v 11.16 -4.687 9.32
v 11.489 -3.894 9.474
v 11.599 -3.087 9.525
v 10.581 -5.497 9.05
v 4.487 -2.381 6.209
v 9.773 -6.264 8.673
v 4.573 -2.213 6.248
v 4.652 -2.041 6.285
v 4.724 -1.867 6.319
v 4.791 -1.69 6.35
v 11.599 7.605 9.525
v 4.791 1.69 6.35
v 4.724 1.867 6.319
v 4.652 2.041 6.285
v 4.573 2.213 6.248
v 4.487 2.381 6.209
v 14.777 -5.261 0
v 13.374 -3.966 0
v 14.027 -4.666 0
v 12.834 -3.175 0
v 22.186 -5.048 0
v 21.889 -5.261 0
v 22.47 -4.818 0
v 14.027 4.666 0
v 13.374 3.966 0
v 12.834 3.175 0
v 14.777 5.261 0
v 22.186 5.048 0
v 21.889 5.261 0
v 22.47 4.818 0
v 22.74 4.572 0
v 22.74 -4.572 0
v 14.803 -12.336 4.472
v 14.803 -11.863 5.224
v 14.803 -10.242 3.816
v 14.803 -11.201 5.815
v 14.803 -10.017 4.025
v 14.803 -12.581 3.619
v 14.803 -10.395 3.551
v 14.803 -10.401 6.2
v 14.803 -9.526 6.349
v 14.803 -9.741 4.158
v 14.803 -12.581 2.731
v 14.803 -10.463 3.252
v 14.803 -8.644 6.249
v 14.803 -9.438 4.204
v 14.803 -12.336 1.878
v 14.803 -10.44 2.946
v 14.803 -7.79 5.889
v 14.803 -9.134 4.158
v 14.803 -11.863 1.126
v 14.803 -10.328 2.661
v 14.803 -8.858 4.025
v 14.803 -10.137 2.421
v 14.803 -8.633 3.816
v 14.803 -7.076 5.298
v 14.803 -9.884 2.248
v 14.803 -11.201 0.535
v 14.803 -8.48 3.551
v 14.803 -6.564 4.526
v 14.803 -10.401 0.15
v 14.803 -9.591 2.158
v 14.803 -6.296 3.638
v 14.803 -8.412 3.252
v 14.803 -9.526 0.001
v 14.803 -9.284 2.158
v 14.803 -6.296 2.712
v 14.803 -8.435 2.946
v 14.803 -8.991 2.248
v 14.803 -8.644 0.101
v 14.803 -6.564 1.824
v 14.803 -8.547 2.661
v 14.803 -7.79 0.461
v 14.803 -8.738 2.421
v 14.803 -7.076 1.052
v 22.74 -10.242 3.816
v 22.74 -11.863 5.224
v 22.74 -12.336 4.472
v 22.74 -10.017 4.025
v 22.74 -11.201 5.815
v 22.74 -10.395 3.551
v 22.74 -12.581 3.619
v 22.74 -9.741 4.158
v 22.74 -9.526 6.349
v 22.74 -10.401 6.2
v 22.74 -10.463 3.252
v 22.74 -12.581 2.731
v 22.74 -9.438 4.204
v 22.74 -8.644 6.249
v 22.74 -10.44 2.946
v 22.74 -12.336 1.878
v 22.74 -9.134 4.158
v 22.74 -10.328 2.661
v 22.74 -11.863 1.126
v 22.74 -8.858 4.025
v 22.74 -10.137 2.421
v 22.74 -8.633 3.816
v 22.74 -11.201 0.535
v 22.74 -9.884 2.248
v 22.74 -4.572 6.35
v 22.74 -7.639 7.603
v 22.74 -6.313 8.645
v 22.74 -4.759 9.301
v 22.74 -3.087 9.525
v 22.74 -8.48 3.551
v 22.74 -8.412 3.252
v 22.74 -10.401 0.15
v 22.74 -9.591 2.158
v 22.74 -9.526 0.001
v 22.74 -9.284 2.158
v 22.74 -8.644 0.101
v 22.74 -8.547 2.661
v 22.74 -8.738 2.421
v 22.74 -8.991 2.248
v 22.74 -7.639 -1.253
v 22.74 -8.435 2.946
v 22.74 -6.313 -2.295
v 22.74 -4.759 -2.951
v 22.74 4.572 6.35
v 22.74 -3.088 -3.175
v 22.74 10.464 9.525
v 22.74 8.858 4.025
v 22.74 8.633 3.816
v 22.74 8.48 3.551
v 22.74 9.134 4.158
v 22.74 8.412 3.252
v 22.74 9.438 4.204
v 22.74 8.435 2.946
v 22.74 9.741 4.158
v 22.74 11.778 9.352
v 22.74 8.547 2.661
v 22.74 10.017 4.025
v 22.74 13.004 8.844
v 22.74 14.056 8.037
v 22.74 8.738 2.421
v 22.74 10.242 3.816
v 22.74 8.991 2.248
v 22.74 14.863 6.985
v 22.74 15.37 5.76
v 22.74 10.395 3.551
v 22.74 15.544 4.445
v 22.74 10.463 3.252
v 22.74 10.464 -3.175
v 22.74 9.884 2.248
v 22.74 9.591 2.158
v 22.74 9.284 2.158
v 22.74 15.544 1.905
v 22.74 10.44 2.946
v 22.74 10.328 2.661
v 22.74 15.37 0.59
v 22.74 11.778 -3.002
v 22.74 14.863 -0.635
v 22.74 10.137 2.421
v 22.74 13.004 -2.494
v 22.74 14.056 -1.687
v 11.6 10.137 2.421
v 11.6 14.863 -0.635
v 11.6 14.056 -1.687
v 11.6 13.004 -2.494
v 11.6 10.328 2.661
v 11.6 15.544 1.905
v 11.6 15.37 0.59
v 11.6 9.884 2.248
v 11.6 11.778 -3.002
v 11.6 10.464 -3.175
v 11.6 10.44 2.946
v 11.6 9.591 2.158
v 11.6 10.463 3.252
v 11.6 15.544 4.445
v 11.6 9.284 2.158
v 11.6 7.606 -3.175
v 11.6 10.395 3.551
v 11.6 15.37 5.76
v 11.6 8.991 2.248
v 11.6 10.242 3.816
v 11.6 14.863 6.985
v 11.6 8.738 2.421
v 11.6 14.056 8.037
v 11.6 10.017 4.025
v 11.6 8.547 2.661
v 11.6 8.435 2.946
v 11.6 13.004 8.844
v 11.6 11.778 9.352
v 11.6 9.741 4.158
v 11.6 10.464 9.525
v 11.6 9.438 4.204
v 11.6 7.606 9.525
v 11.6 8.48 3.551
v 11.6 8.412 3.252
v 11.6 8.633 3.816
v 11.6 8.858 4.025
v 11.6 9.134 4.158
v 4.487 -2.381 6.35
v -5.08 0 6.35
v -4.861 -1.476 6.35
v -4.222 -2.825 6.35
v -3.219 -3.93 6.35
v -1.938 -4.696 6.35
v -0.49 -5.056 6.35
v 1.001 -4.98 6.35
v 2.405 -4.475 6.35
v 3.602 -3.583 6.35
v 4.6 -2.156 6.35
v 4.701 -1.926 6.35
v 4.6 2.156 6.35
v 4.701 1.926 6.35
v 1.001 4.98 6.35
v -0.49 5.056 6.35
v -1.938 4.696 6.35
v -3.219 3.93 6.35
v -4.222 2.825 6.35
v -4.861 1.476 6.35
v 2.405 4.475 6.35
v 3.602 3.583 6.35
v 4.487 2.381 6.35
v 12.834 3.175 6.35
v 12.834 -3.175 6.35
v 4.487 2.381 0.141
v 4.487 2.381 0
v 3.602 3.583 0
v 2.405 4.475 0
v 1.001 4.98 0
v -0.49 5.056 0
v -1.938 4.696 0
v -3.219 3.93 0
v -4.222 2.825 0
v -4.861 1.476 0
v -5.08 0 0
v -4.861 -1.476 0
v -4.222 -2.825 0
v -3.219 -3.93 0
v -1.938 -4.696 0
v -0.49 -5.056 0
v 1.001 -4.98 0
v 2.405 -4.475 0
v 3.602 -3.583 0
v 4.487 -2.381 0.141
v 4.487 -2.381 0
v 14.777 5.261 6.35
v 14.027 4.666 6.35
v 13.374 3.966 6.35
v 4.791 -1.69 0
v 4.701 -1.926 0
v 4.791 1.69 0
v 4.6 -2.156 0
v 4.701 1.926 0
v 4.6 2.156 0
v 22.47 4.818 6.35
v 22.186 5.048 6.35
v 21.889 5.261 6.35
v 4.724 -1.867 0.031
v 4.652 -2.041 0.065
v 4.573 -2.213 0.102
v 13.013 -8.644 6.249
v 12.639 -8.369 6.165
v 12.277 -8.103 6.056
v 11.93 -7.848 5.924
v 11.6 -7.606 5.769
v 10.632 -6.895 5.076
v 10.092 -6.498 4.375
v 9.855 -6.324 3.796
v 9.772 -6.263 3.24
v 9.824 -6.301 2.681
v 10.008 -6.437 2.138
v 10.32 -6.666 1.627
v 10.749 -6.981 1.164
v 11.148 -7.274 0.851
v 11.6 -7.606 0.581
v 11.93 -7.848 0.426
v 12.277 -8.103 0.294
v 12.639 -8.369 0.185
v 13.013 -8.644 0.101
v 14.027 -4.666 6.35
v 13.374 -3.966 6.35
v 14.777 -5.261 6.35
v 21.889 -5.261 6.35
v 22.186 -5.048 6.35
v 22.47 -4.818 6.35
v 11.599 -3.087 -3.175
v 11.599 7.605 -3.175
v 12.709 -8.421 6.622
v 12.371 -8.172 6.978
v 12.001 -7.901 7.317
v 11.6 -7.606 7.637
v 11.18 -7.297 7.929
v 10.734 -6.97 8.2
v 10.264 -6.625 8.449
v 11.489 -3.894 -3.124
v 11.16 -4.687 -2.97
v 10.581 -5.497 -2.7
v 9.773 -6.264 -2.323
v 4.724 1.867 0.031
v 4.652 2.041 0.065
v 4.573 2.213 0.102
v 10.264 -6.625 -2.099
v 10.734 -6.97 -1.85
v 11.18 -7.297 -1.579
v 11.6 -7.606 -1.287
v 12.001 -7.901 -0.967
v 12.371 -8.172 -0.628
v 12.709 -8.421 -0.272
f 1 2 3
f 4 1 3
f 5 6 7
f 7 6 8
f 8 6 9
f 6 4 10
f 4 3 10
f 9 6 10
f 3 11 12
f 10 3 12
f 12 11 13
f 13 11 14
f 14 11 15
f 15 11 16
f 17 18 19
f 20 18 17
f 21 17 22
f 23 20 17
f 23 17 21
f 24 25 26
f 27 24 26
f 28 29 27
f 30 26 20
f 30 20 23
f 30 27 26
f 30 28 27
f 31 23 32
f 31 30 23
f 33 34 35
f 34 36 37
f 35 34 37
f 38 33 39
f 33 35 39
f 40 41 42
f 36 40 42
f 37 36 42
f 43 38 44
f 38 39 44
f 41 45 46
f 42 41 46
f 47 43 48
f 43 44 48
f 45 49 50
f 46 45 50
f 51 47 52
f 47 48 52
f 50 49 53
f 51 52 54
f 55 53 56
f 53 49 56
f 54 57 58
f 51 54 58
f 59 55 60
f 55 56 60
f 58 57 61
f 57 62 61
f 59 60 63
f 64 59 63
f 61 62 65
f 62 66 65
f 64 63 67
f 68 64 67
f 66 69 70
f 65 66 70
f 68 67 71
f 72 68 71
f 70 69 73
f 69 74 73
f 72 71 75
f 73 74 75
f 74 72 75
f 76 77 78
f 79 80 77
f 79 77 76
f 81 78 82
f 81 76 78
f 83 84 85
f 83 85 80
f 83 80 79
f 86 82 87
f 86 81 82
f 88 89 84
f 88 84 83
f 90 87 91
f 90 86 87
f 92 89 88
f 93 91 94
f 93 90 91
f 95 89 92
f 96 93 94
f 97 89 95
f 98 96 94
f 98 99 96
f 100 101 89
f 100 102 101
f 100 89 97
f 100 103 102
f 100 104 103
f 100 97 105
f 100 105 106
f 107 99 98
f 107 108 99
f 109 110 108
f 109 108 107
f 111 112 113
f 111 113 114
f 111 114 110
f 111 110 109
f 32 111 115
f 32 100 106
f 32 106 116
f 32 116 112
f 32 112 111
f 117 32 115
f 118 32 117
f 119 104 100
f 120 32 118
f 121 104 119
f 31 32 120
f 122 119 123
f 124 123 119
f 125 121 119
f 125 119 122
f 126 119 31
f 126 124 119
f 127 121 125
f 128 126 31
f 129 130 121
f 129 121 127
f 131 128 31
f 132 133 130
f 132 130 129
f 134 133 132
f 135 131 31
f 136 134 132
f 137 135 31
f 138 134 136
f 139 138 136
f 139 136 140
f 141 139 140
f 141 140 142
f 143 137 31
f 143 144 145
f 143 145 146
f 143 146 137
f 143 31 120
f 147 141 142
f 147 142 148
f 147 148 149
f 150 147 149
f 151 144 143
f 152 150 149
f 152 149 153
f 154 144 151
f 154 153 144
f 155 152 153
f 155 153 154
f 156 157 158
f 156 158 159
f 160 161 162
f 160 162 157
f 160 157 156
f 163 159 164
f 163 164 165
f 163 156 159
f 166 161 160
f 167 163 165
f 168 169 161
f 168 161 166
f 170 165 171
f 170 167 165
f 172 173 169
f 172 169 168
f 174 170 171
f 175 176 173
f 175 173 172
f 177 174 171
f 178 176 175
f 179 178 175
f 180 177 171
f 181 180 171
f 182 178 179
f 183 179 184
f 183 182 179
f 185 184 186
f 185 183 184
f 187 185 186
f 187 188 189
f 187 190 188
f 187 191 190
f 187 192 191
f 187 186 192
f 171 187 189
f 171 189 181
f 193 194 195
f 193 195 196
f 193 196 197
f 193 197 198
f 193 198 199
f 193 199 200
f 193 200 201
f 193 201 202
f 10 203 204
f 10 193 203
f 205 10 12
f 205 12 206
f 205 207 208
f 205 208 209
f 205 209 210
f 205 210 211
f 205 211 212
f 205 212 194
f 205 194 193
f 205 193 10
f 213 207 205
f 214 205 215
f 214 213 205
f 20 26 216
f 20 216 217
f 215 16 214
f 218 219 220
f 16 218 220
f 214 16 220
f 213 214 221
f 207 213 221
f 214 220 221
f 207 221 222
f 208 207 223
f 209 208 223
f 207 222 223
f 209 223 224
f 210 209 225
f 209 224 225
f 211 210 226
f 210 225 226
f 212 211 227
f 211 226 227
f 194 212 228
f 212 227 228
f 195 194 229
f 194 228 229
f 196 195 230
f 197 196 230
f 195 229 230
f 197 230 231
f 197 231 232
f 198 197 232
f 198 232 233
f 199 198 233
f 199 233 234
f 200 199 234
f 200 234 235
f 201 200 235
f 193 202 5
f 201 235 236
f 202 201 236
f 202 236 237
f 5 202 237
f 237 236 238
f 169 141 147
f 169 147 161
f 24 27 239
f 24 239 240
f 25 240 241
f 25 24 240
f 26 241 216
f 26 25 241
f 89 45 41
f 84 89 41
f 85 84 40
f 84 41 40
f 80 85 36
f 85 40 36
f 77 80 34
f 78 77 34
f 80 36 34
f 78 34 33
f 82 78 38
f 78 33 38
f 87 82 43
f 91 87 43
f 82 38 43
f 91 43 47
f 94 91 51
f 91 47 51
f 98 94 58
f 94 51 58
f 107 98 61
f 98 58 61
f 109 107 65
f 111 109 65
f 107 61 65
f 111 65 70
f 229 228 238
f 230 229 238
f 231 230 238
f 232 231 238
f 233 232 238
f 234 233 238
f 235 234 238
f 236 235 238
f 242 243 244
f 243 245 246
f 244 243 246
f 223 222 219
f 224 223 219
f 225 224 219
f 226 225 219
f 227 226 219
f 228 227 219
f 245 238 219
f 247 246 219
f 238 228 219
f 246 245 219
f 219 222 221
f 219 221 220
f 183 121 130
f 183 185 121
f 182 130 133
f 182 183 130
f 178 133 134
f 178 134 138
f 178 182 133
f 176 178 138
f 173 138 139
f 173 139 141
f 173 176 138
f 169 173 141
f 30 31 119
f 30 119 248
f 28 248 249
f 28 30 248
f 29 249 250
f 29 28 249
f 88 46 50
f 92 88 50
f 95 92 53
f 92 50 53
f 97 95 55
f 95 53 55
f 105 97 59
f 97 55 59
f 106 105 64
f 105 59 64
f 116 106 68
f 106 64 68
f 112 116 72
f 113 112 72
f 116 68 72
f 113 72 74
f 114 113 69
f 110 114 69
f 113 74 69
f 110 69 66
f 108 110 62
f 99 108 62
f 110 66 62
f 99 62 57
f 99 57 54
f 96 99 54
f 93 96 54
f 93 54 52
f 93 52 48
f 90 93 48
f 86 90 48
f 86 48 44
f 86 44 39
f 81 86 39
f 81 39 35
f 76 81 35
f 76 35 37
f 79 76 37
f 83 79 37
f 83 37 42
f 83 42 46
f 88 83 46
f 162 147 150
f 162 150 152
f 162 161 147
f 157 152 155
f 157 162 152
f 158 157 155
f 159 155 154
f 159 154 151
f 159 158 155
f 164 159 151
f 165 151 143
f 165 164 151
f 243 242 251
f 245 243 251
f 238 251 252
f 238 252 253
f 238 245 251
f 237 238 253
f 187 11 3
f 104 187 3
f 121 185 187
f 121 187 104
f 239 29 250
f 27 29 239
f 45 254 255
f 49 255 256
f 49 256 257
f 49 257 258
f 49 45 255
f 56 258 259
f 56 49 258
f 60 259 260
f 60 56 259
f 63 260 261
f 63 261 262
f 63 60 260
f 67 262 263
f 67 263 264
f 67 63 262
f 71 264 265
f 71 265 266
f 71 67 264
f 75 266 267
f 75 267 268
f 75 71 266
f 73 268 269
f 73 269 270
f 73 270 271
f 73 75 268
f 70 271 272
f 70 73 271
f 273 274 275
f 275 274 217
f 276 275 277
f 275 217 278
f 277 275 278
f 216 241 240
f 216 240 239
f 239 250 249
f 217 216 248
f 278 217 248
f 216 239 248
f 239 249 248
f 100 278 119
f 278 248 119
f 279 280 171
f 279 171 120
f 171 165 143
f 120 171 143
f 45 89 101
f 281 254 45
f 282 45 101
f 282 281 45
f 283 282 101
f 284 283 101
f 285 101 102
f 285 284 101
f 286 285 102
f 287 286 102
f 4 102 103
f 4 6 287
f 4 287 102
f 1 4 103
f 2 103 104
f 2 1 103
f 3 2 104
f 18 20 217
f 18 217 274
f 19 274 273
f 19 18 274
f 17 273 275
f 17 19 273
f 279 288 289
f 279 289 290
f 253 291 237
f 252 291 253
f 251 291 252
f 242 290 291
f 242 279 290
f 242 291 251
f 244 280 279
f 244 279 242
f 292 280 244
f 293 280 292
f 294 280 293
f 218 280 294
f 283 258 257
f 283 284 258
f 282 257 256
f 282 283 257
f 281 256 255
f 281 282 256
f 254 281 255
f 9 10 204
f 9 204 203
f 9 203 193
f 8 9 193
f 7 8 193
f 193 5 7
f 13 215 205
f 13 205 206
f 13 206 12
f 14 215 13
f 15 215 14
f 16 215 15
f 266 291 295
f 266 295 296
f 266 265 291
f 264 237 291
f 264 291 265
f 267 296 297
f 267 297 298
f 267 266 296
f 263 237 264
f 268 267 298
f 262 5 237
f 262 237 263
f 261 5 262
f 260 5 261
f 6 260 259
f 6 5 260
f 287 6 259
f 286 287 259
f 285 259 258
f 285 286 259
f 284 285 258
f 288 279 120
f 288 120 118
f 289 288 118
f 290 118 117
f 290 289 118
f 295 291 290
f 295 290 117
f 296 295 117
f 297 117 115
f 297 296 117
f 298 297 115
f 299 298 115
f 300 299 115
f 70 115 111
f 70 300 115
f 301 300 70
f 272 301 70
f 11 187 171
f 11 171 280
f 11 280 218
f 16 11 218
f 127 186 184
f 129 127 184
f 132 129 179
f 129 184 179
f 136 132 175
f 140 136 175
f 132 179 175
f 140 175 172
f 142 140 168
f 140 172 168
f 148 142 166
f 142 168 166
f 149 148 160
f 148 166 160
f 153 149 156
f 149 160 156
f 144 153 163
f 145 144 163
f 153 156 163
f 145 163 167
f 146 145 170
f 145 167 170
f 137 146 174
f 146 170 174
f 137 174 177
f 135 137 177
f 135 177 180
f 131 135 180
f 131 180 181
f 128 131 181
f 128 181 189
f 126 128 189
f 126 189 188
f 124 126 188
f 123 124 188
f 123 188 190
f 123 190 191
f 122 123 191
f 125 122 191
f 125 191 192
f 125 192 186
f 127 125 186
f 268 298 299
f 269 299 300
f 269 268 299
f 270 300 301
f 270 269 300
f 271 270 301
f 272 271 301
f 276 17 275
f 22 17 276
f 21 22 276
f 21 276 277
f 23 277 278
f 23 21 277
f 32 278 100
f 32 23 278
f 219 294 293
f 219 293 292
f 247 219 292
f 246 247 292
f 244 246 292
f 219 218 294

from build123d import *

# Parameters (mm, degrees)
BOSS_EXTRUDE1_DEPTH   = 6.35
BOSS_EXTRUDE2_START   = 3.175
BOSS_EXTRUDE2_DEPTH   = 12.7
CUT_EXTRUDE1_START    = -3.175
CUT_EXTRUDE1_DEPTH    = 6.35
F_1_CLEARANCE_HOLE1_D = 2.0574
FILLET4_START         = 4.487320853
FILLET4_DEPTH         = 18.252718486
FILLET5_R             = 5.08
CHAMFER3_SIZE         = 7.112
CHAMFER3_SIZE_2       = 3.316380065
BOSS_EXTRUDE3_START   = -7.9375
BOSS_EXTRUDE3_DEPTH   = 7.9375
F_1_CLEARANCE_HOLE2_D = 2.0574
SKETCH14_R            = 3.175
CUT_EXTRUDE2_DEPTH    = 27.974866065


with BuildPart() as part:
    # Sketch1 → Boss-Extrude1 (new body)
    with BuildSketch(Plane.XY):
        with BuildLine():
            Line((4.487320853, -2.38125), (4.487320853, 2.38125))
            ThreePointArc((4.487320853, 2.38125), (-5.08, 0), (4.487320853, -2.38125))
        make_face()
    extrude(amount=BOSS_EXTRUDE1_DEPTH)

    # Sketch2 → Boss-Extrude2 (add)
    with BuildSketch(Plane.XY.offset(6.35).offset(BOSS_EXTRUDE2_START)):
        Polygon((4.487320853, 2.38125), (4.487320853, -2.38125), (11.60035513, -7.606064703), (14.093661168, -9.4375), (22.740039339, -9.4375), (22.740039339, -7.631102389), (22.740039339, 7.631102389), (22.740039339, 15.543564703), (11.60035513, 15.543564703), (11.60035513, 7.606064703), align=None)
    extrude(amount=-BOSS_EXTRUDE2_DEPTH)

    # Sketch10 → Cut-Extrude1 (cut)
    with BuildSketch(Plane(origin=(0, 0, -3.175), x_dir=(-1, 0, 0), z_dir=(0, 0, -1)).offset(CUT_EXTRUDE1_START)):
        with BuildLine():
            Line((-22.740039339, -4.572), (-22.740039339, 4.572))
            ThreePointArc((-22.740039339, 4.572), (-22.329545252, 4.934830916), (-21.88930404, 5.260928055))
            Line((-21.88930404, 5.260928055), (-14.77730404, 5.260928055))
            ThreePointArc((-14.77730404, 5.260928055), (-13.687099855, 4.328427737), (-12.834042726, 3.175))
            Line((-12.834042726, 3.175), (-12.834042726, -3.175))
            ThreePointArc((-12.834042726, -3.175), (-13.687099855, -4.328427737), (-14.77730404, -5.260928055))
            Line((-14.77730404, -5.260928055), (-21.88930404, -5.260928055))
            ThreePointArc((-21.88930404, -5.260928055), (-22.329545252, -4.934830916), (-22.740039339, -4.572))
        make_face()
    extrude(amount=-CUT_EXTRUDE1_DEPTH, mode=Mode.SUBTRACT)

    # #1 Clearance Hole1 (through all)
    with Locations(Plane(origin=(22.740039339, 0, 0), x_dir=(0, 0, -1), z_dir=(1, 0, 0))):
        with Locations((-3.175, 9.4375)):
            Hole(F_1_CLEARANCE_HOLE1_D / 2)

    # Fillet4: read off the stored shape, not the designer's step
    # Fillet4 outline → Fillet4 (cut)
    with BuildSketch(Plane.YZ.offset(FILLET4_START)):
        with BuildLine():
            Line((-9.4375, -3.175), (-3.0875, -3.175))
            ThreePointArc((-3.0875, -3.175), (-7.577628061, -1.315128061), (-9.4375, 3.175))
            Line((-9.4375, 3.175), (-9.4375, -3.175))
        make_face()
        with BuildLine():
            Line((-9.4375, 9.525), (-9.4375, 3.175))
            ThreePointArc((-9.4375, 3.175), (-7.577628061, 7.665128061), (-3.0875, 9.525))
            Line((-3.0875, 9.525), (-9.4375, 9.525))
        make_face()
    extrude(amount=FILLET4_DEPTH, mode=Mode.SUBTRACT)

    # Fillet5
    fillet5_edges = [part.edges().sort_by_distance(p)[0] for p in [
        (17.170197235, 15.543564703, -3.175),
        (17.170197235, 15.543564703, 9.525),
    ]]
    fillet(fillet5_edges, radius=FILLET5_R)

    # Chamfer3
    # the kernel refuses this chamfer: 7.112, 3.316380065 mm, written as the material it takes off along each edge
    with BuildSketch(Plane(origin=(4.487320853, 20.808267553, -3.175), x_dir=(1, 0, 0), z_dir=(0, -1, 0))) as chamfer3_piece_1_section:
        Polygon((CHAMFER3_SIZE, 0), (0, CHAMFER3_SIZE_2), (0, 0), align=None)
    chamfer3_piece_1 = extrude(amount=41.616535106, mode=Mode.PRIVATE)
    chamfer3_piece_1 = chamfer3_piece_1 - Plane(origin=(0, 0, -3.175), x_dir=(0.8833308765689106, 0.46875000000000017, 0), z_dir=(0, 0, -1)) * Cylinder(5.08, 112, mode=Mode.PRIVATE)
    add(chamfer3_piece_1, mode=Mode.SUBTRACT)
    with BuildSketch(Plane(origin=(4.487320853, 20.808267553, -3.175), x_dir=(1, 0, 0), z_dir=(0, -1, 0))) as chamfer3_piece_2_section:
        Polygon((CHAMFER3_SIZE, 0), (0, CHAMFER3_SIZE_2), (0, 0), align=None)
    chamfer3_piece_2 = extrude(amount=41.616535106, mode=Mode.PRIVATE)
    chamfer3_piece_2 = split(chamfer3_piece_2, bisect_by=Plane(origin=(4.487320853, 20.808267553, 0), z_dir=(0, 0, -1)), keep=Keep.TOP, mode=Mode.PRIVATE)
    add(chamfer3_piece_2, mode=Mode.SUBTRACT)
    with BuildSketch(Plane(origin=(4.487320853, 20.808267553, 9.525), x_dir=(1, 0, 0), z_dir=(0, -1, 0))) as chamfer3_piece_3_section:
        Polygon((CHAMFER3_SIZE, 0), (0, -CHAMFER3_SIZE_2), (0, 0), align=None)
    chamfer3_piece_3 = extrude(amount=41.616535106, mode=Mode.PRIVATE)
    chamfer3_piece_3 = chamfer3_piece_3 - Plane(origin=(0, 0, 9.525), x_dir=(0.8833308765689106, 0.46875000000000017, 0), z_dir=(0, 0, -1)) * Cylinder(5.08, 112, mode=Mode.PRIVATE)
    add(chamfer3_piece_3, mode=Mode.SUBTRACT)
    with BuildSketch(Plane(origin=(4.487320853, 20.808267553, 9.525), x_dir=(1, 0, 0), z_dir=(0, -1, 0))) as chamfer3_piece_4_section:
        Polygon((CHAMFER3_SIZE, 0), (0, -CHAMFER3_SIZE_2), (0, 0), align=None)
    chamfer3_piece_4 = extrude(amount=41.616535106, mode=Mode.PRIVATE)
    chamfer3_piece_4 = split(chamfer3_piece_4, bisect_by=Plane(origin=(4.487320853, 20.808267553, 6.35), z_dir=(0, 0, 1)), keep=Keep.TOP, mode=Mode.PRIVATE)
    add(chamfer3_piece_4, mode=Mode.SUBTRACT)

    # Sketch11 → Boss-Extrude3 (add)
    with BuildSketch(Plane(origin=(22.740039339, 0, 0), x_dir=(0, 0, -1), z_dir=(1, 0, 0)).offset(BOSS_EXTRUDE3_START)):
        with BuildLine():
            ThreePointArc((-6.249180531, -8.64375), (-3.175, -12.6125), (-0.100819469, -8.64375))
            ThreePointArc((-0.100819469, -8.64375), (-3.175, -9.4375), (-6.249180531, -8.64375))
        make_face()
    extrude(amount=BOSS_EXTRUDE3_DEPTH)

    # #1 Clearance Hole2 (through all)
    with Locations(Plane(origin=(22.740039339, 0, 0), x_dir=(0, 0, -1), z_dir=(1, 0, 0))):
        with Locations((-3.175, -9.4375)):
            Hole(F_1_CLEARANCE_HOLE2_D / 2)

    # Sketch14 → Cut-Extrude2 (cut, through all)
    with BuildSketch(Plane.ZY.offset(-14.802539339)):
        with Locations((3.175, -9.4375)):
            Circle(SKETCH14_R)
    extrude(amount=CUT_EXTRUDE2_DEPTH, mode=Mode.SUBTRACT)


solid = part.part
